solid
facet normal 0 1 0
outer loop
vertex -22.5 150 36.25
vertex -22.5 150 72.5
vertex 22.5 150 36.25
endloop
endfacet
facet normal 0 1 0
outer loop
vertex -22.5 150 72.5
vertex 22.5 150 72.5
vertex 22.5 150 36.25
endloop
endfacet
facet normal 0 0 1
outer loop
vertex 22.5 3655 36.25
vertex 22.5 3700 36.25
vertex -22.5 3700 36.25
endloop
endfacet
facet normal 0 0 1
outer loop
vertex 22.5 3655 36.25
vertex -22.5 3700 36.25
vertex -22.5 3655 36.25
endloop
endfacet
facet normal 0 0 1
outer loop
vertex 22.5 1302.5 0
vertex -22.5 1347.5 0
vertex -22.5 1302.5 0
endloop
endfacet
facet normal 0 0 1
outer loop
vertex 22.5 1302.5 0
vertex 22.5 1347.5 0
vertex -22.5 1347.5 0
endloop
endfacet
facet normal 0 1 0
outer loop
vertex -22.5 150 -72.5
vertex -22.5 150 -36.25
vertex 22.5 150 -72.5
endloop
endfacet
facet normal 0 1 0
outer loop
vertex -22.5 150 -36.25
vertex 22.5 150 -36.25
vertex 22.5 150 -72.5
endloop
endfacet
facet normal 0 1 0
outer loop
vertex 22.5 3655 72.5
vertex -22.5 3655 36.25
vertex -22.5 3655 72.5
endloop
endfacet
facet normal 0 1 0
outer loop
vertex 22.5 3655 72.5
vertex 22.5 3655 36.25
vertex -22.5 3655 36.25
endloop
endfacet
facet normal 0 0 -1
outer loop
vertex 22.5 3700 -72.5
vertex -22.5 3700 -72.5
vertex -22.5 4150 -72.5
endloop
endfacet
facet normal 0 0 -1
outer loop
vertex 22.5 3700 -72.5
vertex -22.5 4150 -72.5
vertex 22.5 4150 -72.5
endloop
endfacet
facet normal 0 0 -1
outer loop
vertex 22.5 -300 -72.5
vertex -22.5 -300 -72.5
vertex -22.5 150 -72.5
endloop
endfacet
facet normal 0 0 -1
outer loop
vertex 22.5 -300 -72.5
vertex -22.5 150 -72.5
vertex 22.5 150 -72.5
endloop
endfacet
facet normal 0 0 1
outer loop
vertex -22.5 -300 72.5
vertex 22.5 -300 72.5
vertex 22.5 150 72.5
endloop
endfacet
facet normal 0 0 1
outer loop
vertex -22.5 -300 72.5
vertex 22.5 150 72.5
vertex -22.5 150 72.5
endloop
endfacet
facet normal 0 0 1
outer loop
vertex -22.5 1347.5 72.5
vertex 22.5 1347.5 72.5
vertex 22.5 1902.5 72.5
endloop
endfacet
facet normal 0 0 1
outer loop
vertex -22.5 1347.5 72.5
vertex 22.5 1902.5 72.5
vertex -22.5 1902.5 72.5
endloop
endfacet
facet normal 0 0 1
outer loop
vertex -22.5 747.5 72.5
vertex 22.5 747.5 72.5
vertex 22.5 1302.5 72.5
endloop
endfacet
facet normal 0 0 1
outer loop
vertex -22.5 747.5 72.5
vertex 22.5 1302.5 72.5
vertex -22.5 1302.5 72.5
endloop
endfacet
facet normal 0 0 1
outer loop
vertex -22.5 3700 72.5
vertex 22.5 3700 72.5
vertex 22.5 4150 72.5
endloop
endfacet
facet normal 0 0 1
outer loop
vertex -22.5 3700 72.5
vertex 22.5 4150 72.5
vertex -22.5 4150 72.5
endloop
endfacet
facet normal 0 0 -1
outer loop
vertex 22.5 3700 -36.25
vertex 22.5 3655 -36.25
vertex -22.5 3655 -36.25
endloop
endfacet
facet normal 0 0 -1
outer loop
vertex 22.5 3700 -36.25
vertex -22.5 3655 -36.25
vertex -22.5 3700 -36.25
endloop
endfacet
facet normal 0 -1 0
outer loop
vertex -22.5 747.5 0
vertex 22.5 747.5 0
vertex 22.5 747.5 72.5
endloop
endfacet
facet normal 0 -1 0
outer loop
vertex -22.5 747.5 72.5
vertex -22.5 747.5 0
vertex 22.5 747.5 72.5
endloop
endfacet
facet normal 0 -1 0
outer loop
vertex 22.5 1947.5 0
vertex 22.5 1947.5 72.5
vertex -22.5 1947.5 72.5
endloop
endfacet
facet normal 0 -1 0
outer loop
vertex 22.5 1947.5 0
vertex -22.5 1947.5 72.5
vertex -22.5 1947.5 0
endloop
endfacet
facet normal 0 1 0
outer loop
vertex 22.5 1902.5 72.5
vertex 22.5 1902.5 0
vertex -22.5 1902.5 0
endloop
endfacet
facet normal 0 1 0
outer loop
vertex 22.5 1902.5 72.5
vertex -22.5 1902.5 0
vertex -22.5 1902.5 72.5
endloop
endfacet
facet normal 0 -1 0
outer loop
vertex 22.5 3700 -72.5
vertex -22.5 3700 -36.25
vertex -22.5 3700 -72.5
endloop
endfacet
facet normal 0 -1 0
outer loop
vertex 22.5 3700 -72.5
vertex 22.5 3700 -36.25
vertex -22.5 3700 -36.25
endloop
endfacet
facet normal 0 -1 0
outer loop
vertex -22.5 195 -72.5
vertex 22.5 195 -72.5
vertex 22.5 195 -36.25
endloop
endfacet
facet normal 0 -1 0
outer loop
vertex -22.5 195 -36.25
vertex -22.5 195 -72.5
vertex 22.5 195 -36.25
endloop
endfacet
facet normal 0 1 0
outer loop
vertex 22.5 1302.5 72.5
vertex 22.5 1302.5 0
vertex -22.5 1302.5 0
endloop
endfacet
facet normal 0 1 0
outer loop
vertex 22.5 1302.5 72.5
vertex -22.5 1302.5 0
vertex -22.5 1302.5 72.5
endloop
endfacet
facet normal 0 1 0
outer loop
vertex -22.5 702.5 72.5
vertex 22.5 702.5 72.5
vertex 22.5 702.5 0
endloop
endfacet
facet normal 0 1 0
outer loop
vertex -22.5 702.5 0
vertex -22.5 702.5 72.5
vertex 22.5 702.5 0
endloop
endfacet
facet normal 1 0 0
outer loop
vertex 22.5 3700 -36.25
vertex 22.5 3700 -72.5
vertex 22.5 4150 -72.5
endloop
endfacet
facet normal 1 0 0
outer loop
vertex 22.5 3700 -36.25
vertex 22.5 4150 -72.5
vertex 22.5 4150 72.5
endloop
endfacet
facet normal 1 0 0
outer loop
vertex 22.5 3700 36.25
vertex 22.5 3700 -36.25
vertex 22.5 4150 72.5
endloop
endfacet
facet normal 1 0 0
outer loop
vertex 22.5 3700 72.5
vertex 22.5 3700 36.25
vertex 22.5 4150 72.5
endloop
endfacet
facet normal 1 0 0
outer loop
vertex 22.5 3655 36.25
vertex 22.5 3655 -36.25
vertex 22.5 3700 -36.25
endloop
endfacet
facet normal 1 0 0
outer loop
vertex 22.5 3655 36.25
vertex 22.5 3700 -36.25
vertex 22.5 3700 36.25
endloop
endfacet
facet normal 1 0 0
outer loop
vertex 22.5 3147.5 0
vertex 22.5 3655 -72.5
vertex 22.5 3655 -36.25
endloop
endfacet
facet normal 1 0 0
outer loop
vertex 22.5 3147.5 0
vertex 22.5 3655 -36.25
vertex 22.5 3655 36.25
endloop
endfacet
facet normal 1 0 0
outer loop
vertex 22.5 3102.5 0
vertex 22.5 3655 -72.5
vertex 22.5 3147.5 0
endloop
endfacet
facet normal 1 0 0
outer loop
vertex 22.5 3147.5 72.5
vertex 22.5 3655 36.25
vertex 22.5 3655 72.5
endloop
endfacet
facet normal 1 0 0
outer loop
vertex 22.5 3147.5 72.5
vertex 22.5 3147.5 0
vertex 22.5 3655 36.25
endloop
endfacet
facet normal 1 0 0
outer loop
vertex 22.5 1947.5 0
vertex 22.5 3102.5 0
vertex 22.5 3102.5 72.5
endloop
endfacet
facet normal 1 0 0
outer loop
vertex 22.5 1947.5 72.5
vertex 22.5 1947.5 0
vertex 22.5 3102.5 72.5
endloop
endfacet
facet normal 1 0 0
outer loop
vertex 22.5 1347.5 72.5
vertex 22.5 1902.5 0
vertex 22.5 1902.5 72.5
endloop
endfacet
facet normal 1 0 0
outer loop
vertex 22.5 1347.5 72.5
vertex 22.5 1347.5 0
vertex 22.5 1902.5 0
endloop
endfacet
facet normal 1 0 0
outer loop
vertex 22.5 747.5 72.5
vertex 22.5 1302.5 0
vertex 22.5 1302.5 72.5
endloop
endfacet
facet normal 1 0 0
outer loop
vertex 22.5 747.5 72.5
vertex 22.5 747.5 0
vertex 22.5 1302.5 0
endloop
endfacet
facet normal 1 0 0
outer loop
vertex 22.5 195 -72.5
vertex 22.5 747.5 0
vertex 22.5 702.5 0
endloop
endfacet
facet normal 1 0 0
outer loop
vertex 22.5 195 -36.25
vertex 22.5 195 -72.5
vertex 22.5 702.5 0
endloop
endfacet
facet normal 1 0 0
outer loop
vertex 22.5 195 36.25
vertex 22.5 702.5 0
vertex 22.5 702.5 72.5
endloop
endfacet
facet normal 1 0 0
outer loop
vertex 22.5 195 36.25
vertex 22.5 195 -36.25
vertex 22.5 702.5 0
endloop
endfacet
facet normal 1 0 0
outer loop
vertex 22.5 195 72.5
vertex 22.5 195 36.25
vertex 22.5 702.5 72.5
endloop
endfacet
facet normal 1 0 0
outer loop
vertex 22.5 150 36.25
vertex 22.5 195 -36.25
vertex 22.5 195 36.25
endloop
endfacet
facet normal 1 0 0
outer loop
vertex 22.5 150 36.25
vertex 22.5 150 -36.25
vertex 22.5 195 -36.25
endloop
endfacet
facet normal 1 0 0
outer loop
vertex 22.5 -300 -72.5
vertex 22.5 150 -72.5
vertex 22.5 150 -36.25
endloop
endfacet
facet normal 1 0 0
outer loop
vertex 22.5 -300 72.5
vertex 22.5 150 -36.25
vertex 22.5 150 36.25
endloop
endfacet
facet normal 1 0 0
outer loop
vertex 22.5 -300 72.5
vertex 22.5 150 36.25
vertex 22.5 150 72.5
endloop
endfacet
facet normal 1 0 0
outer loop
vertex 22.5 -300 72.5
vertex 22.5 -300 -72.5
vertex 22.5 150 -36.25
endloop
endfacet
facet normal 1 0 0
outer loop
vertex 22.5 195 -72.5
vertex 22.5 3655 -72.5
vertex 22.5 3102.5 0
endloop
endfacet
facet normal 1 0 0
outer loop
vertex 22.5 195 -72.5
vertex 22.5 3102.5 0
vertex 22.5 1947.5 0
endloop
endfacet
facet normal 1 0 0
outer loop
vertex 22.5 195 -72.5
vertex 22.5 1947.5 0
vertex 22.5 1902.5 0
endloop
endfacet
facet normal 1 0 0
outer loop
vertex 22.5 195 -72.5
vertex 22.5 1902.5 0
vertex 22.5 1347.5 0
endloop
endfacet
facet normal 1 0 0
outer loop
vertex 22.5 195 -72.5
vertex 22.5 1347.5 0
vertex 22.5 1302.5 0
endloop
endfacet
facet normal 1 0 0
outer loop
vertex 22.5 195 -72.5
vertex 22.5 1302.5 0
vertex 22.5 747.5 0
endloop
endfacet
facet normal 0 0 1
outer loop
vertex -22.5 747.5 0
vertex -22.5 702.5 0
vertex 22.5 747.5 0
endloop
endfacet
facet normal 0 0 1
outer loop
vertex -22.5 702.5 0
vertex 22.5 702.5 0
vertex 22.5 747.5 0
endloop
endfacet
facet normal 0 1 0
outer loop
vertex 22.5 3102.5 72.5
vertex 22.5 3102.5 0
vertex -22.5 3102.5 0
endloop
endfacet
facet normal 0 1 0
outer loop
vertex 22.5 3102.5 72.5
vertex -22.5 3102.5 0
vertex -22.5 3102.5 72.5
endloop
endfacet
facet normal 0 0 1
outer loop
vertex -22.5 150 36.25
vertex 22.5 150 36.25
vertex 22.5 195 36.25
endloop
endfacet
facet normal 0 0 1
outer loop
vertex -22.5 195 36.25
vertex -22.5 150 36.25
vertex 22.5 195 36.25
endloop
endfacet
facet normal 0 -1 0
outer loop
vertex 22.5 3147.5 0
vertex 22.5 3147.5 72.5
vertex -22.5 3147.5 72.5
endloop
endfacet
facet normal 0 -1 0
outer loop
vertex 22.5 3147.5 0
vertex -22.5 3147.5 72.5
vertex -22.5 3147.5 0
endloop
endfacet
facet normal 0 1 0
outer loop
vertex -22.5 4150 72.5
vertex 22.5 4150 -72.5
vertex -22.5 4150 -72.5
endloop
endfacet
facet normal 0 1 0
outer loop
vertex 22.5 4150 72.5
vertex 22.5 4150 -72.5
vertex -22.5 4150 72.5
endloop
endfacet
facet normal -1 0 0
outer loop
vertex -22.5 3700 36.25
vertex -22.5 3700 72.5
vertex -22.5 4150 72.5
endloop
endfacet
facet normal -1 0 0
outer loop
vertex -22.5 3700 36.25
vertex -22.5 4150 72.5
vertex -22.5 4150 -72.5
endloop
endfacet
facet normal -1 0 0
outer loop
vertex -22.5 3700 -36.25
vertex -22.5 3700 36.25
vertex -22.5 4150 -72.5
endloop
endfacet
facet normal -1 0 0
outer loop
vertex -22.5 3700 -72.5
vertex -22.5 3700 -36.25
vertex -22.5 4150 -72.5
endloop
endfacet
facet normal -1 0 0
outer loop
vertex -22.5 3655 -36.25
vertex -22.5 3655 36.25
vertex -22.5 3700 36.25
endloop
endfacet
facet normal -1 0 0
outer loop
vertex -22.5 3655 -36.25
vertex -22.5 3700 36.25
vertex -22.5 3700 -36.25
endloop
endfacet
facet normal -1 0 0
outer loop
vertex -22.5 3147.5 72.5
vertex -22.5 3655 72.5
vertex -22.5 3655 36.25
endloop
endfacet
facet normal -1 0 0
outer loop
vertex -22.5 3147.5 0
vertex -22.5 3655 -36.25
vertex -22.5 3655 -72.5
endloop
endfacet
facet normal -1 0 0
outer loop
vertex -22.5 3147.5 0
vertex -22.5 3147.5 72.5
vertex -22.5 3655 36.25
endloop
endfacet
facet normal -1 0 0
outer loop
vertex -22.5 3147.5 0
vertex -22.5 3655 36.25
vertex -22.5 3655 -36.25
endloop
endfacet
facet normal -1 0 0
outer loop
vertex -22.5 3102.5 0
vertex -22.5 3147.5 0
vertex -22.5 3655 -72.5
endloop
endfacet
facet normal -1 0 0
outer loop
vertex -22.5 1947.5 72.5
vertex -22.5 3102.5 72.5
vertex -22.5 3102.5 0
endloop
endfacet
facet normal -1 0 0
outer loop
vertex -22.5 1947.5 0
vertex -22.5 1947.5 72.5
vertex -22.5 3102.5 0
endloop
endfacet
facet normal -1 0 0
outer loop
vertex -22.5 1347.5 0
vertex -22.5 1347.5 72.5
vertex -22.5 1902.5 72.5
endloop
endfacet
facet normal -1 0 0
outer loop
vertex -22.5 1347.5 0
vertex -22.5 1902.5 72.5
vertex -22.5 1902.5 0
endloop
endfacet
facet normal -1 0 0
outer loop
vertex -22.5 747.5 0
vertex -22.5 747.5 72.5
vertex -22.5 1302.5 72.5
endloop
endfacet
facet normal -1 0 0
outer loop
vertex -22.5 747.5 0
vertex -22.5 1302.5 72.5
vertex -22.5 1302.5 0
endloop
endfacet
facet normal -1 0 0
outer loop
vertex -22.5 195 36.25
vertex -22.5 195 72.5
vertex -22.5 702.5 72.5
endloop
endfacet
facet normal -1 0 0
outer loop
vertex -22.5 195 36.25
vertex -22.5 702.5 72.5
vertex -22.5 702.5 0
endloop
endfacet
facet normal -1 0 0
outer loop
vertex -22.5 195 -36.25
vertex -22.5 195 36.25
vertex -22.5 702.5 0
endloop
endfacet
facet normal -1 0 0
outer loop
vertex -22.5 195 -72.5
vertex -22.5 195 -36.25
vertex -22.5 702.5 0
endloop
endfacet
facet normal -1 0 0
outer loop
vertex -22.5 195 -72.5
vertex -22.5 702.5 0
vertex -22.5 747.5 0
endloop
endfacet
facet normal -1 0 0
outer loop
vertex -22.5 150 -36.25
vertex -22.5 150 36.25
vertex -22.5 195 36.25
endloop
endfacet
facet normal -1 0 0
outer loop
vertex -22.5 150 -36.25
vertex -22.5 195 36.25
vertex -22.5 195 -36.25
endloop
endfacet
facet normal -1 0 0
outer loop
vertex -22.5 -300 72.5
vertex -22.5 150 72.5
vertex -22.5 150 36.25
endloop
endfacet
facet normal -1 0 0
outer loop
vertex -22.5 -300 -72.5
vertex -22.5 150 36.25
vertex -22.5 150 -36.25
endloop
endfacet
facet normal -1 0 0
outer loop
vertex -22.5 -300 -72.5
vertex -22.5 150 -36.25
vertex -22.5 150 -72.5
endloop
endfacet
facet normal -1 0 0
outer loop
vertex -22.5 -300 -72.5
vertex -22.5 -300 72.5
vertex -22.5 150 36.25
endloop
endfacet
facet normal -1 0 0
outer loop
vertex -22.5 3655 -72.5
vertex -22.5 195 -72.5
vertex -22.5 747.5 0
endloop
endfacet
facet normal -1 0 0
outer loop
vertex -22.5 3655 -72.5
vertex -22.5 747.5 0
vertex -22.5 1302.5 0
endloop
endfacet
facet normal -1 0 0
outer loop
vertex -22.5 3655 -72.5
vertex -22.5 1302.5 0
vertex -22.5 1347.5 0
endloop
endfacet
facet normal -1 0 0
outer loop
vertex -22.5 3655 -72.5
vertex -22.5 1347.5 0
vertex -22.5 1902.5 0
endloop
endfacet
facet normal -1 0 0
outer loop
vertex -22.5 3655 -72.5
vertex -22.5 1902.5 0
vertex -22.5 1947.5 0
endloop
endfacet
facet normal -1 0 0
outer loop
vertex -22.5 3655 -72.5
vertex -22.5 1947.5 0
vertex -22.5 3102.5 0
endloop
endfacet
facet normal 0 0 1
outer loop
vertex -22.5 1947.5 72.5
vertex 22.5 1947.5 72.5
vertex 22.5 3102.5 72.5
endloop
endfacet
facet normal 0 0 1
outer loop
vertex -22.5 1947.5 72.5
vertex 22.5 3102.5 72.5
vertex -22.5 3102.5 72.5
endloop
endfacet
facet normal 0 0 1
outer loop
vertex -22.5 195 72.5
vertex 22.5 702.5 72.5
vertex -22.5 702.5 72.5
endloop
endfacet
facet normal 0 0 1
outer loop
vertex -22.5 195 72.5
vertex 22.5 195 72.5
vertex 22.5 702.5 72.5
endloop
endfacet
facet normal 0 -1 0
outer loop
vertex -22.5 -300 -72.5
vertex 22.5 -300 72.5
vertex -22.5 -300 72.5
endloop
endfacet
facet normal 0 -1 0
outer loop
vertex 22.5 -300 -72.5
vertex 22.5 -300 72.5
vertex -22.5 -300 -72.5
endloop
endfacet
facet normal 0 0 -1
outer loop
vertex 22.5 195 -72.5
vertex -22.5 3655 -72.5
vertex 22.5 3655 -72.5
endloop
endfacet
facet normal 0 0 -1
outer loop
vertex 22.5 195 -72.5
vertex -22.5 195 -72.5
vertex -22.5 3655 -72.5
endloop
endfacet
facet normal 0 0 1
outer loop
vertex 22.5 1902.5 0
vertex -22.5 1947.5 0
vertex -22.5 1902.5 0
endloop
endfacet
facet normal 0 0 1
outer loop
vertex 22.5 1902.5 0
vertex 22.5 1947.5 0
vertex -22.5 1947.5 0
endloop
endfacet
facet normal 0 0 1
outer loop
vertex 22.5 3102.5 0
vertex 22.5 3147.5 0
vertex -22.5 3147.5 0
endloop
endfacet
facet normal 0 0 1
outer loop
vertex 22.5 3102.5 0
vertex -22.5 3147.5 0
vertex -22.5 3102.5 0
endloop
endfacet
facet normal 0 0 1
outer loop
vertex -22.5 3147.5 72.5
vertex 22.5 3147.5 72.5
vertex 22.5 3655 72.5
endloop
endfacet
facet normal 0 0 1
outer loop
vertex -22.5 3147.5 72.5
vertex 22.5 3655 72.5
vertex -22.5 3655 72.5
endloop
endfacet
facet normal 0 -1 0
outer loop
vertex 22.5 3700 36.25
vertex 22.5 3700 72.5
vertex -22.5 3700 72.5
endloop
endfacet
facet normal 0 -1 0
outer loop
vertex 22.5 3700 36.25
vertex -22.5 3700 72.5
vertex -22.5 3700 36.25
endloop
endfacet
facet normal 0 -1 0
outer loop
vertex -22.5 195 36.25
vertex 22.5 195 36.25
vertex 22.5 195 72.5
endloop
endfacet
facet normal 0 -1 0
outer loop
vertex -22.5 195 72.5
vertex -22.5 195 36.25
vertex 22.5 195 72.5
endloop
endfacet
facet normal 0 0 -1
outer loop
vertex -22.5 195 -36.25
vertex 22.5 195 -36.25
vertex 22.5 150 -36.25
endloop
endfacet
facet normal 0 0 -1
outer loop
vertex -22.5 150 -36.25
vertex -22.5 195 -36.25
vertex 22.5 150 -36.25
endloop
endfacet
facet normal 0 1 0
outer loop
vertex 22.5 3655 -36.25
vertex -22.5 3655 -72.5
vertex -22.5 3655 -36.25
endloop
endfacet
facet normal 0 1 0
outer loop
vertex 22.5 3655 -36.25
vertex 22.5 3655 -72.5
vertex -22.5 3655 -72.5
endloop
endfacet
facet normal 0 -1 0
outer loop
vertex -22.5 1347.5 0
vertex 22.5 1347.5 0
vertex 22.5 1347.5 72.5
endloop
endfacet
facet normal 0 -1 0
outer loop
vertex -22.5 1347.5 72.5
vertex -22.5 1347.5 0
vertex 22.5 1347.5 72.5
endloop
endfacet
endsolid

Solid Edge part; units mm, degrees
sketch "Sketch1" plane through (0, 0, 0) normal (0, -1, 0) x (1, 0, 0)
  line L0 (-22.5, -72.5) -> (22.5, -72.5)
  line L1 (22.5, -72.5) -> (22.5, 72.5)
  line L2 (22.5, 72.5) -> (-22.5, 72.5)
  line L3 (-22.5, 72.5) -> (-22.5, -72.5)
extrude "Protrusion1" add sketch "Sketch1" against normal blind 3850
sketch "Sketch2" plane through (22.5, 1925, 0) normal (1, 0, 0) x (0, 1, 0)
  line L0 (1775, 72.5) -> (1775, 36.25)
  line L1 (1775, 36.25) -> (1730, 36.25)
  line L2 (1730, 36.25) -> (1730, 72.5)
  line L3 (1730, 72.5) -> (1775, 72.5)
  line L4 (-1775, 72.5) -> (-1775, 36.25)
  line L5 (-1775, 36.25) -> (-1730, 36.25)
  line L6 (-1730, 36.25) -> (-1730, 72.5)
  line L7 (-1730, 72.5) -> (-1775, 72.5)
extrude "ExtrudedCutout_1" cut sketch "Sketch2" against normal blind 86.6929
mirror "Mirror1" about plane through (0, 0, 0) normal (0, 0, -1) of "ExtrudedCutout_1"
sketch "Sketch3" plane through (0, 3850, 0) normal (0, 1, 0) x (-1, 0, 0)
  line L0 (-22.5, -72.5) -> (22.5, -72.5)
  line L1 (22.5, -72.5) -> (22.5, 72.5)
  line L2 (22.5, 72.5) -> (-22.5, 72.5)
  line L3 (-22.5, 72.5) -> (-22.5, -72.5)
extrude "ExtrudedProtrusion_2" add sketch "Sketch3" along normal blind 300
sketch "Sketch4" plane through (0, 0, 0) normal (0, -1, 0) x (1, 0, 0)
  line L0 (-22.5, -72.5) -> (22.5, -72.5)
  line L1 (22.5, -72.5) -> (22.5, 72.5)
  line L2 (22.5, 72.5) -> (-22.5, 72.5)
  line L3 (-22.5, 72.5) -> (-22.5, -72.5)
extrude "ExtrudedProtrusion_3" add sketch "Sketch4" along normal blind 300
sketch "Sketch5" plane through (22.5, 1925, 0) normal (1, 0, 0) x (0, 1, 0)
  line L0 (0, 72.5) -> (-22.5, 72.5)
  line L1 (-22.5, 0) -> (-22.5, 72.5)
  line L2 (22.5, 0) -> (-22.5, 0)
  line L3 (22.5, 72.5) -> (22.5, 0)
  line L4 (0, 72.5) -> (22.5, 72.5)
  line L5 (-600, 0) -> (-577.5, 0)
  line L6 (-577.5, 0) -> (-577.5, 72.5)
  line L7 (-577.5, 72.5) -> (-622.5, 72.5)
  line L8 (-622.5, 0) -> (-622.5, 72.5)
  line L9 (-600, 0) -> (-622.5, 0)
  line L10 (-1200, 72.5) -> (-1222.5, 72.5)
  line L11 (-1222.5, 72.5) -> (-1222.5, 0)
  line L12 (-1222.5, 0) -> (-1177.5, 0)
  line L13 (-1177.5, 0) -> (-1177.5, 72.5)
  line L14 (-1177.5, 72.5) -> (-1200, 72.5)
  line L15 (1200, 72.5) -> (1222.5, 72.5)
  line L16 (1222.5, 72.5) -> (1222.5, 0)
  line L17 (1222.5, 0) -> (1177.5, 0)
  line L18 (1177.5, 0) -> (1177.5, 72.5)
  line L19 (1177.5, 72.5) -> (1200, 72.5)
extrude "ExtrudedCutout_2" cut sketch "Sketch5" against normal blind 122.0122
properties material "Wood, Pine"
